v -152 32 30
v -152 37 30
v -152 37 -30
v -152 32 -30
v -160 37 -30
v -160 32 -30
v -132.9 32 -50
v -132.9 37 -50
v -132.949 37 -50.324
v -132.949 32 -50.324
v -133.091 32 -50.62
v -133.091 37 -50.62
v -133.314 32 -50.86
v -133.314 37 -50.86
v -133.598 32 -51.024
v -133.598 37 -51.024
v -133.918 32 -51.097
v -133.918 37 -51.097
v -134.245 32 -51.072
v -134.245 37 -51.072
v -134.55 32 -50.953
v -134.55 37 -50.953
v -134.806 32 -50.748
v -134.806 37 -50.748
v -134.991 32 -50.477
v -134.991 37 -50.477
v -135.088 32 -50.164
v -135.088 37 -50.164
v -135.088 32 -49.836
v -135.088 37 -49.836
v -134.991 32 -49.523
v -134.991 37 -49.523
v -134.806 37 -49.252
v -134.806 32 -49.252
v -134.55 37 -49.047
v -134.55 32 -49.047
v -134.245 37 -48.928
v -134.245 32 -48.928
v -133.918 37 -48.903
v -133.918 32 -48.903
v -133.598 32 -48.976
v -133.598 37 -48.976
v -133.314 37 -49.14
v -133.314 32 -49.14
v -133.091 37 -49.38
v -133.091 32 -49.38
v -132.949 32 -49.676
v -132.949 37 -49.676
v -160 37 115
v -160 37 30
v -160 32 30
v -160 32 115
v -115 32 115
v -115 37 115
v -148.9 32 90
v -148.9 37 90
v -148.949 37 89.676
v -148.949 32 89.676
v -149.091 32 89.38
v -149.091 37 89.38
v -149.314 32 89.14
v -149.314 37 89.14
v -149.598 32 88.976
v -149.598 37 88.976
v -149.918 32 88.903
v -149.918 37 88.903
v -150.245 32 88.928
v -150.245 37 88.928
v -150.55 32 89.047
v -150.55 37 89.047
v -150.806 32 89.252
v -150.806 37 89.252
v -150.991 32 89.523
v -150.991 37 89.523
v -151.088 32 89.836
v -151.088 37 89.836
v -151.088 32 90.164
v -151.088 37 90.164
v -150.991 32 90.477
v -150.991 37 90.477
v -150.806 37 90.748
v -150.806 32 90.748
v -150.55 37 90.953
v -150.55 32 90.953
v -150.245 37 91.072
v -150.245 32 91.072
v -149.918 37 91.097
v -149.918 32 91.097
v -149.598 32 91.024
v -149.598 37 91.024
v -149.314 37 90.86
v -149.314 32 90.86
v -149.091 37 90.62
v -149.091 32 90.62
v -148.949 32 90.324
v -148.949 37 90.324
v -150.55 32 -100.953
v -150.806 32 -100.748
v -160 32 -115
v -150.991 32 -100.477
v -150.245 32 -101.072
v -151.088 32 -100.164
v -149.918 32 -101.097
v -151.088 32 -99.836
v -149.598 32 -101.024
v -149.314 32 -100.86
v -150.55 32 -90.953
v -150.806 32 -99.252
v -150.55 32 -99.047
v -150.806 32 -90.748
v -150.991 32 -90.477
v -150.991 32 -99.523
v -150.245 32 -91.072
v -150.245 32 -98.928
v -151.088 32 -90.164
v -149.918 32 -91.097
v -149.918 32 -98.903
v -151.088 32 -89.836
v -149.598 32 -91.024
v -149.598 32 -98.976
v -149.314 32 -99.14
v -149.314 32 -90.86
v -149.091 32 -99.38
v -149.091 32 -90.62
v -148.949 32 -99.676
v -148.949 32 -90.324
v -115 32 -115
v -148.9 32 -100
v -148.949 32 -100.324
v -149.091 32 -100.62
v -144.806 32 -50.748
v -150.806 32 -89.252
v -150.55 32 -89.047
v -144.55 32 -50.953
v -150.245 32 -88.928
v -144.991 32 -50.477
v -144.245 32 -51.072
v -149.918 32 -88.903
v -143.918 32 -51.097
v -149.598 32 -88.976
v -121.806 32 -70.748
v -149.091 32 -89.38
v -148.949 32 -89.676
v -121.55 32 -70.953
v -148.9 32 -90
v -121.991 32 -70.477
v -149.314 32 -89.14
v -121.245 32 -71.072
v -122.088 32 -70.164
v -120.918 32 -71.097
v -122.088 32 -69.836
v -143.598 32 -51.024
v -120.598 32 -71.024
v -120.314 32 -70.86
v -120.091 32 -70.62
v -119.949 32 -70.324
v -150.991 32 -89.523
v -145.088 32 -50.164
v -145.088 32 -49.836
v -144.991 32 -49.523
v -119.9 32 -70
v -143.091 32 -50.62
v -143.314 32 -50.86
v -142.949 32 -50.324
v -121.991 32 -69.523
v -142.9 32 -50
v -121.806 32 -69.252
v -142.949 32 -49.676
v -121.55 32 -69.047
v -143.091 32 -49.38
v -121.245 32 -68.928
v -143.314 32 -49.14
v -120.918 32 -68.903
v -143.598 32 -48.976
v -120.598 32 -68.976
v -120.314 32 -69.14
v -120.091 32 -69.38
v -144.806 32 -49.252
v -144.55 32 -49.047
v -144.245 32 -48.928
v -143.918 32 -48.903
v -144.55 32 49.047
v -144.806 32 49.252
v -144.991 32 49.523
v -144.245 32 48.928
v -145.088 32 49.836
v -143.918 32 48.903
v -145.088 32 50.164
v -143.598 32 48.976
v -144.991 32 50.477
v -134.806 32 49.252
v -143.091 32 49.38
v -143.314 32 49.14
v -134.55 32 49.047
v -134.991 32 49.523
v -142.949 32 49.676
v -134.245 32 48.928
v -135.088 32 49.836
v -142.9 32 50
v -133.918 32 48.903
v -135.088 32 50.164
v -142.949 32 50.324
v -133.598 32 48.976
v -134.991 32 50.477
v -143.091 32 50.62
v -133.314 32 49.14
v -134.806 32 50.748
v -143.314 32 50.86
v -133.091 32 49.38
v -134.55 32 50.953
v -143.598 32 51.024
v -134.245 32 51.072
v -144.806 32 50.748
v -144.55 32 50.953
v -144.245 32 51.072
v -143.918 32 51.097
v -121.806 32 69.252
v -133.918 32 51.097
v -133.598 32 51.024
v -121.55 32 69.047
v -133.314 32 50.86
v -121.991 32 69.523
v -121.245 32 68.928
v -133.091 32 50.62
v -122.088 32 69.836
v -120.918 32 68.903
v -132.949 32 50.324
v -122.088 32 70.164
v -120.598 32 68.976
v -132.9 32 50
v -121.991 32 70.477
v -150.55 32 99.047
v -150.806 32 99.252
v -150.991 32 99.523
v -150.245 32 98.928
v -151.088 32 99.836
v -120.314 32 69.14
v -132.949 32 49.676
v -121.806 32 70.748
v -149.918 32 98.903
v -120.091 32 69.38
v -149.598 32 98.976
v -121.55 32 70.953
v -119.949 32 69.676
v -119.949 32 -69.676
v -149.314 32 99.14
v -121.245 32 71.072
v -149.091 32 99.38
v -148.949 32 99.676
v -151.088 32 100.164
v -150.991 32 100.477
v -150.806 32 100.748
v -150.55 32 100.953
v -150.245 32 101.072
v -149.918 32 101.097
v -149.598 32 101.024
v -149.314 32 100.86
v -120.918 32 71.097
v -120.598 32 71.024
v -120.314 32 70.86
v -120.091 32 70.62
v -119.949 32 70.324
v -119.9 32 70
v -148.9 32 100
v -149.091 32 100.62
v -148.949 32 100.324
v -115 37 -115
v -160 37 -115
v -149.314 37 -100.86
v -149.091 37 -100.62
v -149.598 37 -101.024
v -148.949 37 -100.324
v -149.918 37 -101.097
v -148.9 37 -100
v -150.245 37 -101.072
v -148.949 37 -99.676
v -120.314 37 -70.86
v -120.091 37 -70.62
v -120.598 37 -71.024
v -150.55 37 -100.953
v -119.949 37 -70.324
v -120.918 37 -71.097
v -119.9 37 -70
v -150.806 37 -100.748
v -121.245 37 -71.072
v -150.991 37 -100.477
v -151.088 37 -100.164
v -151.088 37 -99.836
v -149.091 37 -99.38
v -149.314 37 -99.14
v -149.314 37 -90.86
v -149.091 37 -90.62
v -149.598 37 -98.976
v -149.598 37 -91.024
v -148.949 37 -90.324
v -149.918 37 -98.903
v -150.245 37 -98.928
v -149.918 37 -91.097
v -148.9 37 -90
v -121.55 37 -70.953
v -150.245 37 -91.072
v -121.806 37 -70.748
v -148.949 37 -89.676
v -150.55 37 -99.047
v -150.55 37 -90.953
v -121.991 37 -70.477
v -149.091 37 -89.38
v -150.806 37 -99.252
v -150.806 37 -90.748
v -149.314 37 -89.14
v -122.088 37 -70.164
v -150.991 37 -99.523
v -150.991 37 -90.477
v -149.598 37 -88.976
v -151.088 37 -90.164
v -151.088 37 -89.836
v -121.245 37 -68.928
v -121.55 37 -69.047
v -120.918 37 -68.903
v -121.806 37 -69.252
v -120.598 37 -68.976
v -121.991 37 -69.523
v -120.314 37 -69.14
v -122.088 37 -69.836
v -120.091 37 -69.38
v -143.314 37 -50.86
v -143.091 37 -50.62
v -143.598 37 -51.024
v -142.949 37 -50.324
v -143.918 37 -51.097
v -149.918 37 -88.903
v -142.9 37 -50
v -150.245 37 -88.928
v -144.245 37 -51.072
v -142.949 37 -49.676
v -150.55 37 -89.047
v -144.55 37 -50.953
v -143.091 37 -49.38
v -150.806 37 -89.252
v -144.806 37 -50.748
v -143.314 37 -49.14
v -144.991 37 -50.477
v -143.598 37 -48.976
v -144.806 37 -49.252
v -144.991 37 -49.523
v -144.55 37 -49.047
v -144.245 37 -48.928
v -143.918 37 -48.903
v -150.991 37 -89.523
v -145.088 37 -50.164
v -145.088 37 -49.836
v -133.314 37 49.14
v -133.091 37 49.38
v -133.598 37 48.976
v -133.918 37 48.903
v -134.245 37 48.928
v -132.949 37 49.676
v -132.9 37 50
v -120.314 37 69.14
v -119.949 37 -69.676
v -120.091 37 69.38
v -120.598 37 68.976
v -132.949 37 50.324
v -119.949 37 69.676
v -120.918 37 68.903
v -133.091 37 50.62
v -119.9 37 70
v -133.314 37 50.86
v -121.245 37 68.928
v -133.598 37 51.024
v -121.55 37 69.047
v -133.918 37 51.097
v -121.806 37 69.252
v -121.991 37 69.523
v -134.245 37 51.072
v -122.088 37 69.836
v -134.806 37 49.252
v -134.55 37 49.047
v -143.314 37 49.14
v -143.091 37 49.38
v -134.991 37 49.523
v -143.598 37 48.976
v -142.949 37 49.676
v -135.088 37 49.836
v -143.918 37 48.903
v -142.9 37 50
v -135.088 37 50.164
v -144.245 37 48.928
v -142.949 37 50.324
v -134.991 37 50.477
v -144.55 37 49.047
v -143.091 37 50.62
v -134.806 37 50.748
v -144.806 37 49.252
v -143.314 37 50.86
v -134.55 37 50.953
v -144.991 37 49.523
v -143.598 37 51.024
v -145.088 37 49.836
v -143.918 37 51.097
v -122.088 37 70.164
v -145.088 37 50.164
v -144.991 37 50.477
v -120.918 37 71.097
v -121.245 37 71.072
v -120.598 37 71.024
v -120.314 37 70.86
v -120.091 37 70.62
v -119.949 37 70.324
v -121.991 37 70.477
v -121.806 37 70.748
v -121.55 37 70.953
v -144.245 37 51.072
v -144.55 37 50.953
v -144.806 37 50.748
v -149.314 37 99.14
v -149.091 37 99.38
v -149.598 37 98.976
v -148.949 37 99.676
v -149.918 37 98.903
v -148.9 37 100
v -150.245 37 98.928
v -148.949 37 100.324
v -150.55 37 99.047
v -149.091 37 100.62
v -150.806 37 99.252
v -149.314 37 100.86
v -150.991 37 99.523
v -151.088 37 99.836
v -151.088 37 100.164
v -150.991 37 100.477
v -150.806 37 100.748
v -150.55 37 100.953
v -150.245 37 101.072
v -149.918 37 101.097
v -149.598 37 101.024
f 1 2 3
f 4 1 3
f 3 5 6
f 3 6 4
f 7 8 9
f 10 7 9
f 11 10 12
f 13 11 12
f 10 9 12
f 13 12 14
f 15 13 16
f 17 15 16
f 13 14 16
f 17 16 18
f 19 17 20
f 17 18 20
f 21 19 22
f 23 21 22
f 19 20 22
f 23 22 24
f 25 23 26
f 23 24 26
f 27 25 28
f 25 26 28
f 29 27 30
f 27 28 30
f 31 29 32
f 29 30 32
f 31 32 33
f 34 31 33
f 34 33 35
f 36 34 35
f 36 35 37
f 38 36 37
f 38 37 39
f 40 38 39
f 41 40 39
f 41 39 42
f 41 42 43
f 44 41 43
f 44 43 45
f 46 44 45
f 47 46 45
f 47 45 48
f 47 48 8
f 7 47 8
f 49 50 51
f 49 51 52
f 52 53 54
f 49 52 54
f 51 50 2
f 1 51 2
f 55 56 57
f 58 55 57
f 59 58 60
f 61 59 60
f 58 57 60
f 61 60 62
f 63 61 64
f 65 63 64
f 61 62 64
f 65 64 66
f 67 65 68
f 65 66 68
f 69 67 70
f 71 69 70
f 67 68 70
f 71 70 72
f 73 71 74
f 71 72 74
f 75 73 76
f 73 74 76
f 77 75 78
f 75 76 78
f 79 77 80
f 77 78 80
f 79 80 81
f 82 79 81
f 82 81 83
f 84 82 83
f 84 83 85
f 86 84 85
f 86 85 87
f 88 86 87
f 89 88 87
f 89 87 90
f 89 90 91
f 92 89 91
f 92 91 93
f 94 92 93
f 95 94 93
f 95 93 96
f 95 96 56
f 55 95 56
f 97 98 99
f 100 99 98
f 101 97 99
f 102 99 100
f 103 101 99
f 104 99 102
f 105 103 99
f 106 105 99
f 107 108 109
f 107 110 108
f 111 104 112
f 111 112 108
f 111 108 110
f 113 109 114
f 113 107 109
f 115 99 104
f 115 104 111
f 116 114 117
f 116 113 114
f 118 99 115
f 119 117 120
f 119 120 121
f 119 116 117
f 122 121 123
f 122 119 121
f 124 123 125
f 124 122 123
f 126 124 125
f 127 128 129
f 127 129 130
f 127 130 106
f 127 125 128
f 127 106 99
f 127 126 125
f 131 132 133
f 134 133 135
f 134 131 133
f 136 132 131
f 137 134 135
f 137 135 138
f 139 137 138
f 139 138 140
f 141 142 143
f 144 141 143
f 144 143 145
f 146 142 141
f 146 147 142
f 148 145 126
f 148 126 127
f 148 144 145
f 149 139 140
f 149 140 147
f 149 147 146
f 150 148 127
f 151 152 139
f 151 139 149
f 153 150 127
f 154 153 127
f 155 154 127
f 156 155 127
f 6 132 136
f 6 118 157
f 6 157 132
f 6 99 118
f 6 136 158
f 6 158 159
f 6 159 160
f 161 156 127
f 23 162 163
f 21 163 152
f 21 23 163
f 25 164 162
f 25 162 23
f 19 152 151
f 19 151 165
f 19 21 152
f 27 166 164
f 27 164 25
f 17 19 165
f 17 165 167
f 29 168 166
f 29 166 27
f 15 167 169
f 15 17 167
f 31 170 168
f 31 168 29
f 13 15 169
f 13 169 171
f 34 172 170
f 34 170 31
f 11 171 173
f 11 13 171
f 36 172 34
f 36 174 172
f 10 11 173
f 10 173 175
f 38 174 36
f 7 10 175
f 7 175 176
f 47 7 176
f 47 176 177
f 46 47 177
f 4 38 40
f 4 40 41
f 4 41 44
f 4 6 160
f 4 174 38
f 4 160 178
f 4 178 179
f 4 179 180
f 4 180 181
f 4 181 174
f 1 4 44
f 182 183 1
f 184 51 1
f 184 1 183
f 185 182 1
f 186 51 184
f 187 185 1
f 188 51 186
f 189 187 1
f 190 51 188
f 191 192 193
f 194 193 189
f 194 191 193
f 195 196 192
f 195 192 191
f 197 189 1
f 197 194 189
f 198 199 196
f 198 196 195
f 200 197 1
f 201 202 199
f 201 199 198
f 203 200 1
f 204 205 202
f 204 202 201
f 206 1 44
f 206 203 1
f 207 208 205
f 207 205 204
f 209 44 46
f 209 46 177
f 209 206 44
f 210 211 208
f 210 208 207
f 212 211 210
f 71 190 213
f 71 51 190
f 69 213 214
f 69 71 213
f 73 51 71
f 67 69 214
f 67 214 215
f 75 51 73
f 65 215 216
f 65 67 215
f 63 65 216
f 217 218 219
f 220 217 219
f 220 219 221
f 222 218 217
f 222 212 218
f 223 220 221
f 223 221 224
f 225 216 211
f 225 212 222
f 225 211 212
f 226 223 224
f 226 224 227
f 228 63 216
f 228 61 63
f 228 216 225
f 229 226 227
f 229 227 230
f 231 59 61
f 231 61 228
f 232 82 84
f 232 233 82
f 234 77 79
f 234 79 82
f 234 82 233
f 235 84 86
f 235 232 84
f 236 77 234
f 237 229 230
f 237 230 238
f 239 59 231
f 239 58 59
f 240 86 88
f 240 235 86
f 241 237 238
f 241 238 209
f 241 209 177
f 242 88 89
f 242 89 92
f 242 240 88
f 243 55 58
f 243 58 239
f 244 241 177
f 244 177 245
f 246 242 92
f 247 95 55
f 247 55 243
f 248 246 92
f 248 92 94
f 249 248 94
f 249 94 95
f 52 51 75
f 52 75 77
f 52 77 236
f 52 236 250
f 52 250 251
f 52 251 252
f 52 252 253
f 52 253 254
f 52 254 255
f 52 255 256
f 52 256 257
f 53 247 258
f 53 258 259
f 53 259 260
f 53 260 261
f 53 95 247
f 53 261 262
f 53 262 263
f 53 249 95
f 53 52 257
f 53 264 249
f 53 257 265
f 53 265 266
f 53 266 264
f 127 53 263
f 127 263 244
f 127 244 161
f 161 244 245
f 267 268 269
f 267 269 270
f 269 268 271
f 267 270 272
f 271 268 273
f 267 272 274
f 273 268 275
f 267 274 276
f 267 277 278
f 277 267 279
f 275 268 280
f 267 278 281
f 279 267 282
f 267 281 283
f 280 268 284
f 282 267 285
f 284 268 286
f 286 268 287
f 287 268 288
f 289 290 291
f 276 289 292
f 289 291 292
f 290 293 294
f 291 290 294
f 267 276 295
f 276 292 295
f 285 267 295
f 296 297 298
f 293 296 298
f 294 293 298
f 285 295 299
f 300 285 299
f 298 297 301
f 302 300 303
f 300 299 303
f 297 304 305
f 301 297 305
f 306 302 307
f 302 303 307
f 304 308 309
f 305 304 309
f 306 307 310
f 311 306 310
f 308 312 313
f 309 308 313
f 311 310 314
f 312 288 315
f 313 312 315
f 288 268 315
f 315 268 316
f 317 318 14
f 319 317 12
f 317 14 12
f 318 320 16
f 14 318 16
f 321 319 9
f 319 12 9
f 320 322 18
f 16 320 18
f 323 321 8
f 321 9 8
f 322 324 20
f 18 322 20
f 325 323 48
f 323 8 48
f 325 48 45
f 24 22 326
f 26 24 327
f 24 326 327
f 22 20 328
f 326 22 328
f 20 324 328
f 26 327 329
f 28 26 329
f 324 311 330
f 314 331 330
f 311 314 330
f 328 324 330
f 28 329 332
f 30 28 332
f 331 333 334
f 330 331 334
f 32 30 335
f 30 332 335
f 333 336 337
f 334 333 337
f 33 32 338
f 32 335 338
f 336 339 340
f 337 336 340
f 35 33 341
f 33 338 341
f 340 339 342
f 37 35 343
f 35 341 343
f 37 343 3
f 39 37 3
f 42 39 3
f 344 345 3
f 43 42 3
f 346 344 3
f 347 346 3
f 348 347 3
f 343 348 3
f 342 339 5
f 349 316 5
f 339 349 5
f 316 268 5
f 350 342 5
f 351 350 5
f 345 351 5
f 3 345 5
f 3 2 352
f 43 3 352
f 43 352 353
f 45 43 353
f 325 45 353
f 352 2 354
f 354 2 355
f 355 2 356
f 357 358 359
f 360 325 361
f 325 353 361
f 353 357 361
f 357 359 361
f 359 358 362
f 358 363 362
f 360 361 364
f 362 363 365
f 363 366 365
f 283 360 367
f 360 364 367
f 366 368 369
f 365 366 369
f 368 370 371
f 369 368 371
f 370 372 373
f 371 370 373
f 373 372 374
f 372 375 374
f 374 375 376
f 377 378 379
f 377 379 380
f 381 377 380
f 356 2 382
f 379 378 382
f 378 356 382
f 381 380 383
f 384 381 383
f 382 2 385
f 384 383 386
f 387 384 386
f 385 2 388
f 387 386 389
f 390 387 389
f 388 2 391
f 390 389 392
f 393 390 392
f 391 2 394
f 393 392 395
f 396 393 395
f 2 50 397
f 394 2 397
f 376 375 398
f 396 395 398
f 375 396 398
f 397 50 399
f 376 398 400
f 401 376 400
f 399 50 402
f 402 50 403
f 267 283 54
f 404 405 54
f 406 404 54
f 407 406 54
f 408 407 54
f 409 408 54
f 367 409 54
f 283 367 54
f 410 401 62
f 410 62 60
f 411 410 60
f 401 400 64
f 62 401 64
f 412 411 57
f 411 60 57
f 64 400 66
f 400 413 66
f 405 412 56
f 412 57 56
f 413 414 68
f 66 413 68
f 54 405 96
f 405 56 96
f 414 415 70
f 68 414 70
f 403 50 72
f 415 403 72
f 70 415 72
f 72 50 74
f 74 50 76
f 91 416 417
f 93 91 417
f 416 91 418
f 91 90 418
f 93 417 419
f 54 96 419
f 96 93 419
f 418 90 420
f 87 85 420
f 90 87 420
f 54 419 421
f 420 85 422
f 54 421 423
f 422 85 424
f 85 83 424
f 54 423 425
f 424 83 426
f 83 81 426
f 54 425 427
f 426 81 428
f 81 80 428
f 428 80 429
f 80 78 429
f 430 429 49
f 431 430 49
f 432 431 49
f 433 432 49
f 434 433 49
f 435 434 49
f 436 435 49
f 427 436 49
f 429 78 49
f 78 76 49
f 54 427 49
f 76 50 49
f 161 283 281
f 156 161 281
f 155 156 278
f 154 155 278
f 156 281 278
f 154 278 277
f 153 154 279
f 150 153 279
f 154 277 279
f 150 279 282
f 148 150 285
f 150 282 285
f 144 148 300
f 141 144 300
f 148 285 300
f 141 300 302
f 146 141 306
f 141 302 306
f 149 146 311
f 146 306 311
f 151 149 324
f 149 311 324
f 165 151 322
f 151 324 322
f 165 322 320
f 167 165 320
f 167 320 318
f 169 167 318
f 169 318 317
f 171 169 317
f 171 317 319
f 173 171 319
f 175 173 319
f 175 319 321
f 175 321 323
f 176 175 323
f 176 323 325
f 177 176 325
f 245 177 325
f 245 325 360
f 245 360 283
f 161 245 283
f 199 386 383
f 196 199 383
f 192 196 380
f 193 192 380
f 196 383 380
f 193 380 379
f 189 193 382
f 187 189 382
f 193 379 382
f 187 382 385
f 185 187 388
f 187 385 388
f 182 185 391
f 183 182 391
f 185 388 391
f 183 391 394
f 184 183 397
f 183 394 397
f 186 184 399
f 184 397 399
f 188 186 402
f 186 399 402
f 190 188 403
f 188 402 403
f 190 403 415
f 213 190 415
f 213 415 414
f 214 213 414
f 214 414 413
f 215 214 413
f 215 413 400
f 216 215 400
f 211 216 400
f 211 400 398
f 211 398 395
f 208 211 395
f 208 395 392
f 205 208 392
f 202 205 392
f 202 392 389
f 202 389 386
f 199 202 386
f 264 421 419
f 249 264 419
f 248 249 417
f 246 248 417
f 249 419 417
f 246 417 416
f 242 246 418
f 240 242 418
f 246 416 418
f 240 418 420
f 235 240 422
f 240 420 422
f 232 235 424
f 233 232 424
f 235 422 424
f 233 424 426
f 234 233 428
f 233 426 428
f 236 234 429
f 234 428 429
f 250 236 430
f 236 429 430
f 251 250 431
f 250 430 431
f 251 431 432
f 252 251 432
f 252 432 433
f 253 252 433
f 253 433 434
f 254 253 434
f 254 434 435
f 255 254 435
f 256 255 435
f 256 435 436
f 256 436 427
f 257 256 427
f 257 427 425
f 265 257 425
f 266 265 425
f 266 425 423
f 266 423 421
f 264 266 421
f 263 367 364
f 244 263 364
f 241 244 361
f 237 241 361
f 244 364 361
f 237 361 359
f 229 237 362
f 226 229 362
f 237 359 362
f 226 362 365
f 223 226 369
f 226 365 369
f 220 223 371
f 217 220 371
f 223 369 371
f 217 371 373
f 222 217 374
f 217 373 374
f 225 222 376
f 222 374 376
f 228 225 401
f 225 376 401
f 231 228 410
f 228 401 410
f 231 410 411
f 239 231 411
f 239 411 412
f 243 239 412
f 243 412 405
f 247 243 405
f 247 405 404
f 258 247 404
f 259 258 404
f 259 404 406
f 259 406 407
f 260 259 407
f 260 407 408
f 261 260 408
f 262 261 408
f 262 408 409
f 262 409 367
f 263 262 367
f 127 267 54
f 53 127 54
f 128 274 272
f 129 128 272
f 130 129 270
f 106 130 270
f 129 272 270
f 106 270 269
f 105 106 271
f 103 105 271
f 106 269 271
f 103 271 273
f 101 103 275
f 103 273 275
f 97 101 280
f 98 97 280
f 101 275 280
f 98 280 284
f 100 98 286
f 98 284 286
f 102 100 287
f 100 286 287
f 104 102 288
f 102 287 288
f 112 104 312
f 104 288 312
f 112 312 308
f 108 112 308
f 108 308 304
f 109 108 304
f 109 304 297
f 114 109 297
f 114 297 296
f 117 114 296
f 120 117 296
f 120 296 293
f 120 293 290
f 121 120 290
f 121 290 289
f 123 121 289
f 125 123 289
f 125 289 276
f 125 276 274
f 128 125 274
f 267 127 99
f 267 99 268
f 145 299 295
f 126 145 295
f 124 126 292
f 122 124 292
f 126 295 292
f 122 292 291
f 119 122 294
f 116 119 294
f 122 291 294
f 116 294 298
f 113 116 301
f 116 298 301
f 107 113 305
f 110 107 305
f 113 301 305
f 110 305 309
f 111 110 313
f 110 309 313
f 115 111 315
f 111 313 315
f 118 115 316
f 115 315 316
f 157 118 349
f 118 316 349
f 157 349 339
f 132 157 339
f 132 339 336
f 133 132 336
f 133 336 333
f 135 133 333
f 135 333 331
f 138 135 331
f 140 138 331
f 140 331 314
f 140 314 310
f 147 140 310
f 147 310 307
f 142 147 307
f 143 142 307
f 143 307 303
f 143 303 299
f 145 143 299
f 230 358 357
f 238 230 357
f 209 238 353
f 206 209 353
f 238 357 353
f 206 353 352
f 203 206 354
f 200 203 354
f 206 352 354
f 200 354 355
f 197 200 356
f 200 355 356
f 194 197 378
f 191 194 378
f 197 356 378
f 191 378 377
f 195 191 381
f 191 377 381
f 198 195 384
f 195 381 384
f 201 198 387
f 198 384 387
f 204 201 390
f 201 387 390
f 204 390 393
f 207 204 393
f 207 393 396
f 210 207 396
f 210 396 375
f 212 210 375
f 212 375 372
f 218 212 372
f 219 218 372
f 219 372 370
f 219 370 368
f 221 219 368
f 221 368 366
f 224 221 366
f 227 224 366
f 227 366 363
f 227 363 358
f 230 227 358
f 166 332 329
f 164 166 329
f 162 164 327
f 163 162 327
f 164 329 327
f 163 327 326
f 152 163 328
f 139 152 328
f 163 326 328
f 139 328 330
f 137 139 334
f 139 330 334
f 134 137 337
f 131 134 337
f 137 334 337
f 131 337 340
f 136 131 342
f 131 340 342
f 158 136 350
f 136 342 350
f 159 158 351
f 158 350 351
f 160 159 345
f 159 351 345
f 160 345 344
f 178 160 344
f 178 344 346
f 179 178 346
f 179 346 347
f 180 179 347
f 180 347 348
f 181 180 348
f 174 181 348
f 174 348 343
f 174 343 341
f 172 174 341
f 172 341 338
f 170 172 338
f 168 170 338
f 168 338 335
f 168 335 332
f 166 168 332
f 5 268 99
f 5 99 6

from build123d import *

# Parameters (mm, degrees)
SKETCH1_W                      = 5
SKETCH1_H                      = 110
BOSS_EXTRUDE1_DEPTH            = 120
BOSS_EXTRUDE1_DEPTH_BACK       = 110
BOSS_EXTRUDE1_2_DEPTH          = 120
BOSS_EXTRUDE1_2_DEPTH_BACK     = 110
SKETCH2_W                      = 5
SKETCH2_H                      = 37
BOSS_EXTRUDE2_DEPTH            = 50
SKETCH3_W                      = 220
SKETCH3_H                      = 5
BOSS_EXTRUDE3_DEPTH            = 50
SKETCH4_W                      = 230
SKETCH4_H                      = 73
BOSS_EXTRUDE6_DEPTH            = 5
CUT_EXTRUDE3_DEPTH             = 231
SKETCH5_W                      = 348
SKETCH5_H                      = 227
SKETCH5_W_2                    = 328
SKETCH5_H_2                    = 207
BOSS_EXTRUDE7_DEPTH            = 5
BOSS_EXTRUDE8_DEPTH            = 59
FILLET5_R                      = 15
BOSS_EXTRUDE9_DEPTH            = 5
BOSS_EXTRUDE10_DEPTH           = 5
FILLET6_R                      = 3
CUT_EXTRUDE4_DEPTH             = 165.048773235
SKETCH15_W                     = 45
SKETCH15_H                     = 32
CUT_EXTRUDE5_DEPTH             = 1
CUT_EXTRUDE5_DEPTH_BACK        = 231
SKETCH16_R                     = 1.1
HOLES_FOR_PART_1_DEPTH         = 6
SKETCH17_R                     = 1.1
HOLES_FOR_FORWARD_PART_4_DEPTH = 6
SKETCH18_R                     = 1.1
HOLES_FOR_FORWARD_PART_2_DEPTH = 6
SKETCH19_W                     = 16
SKETCH19_H                     = 60
CUT_EXTRUDE6_DEPTH             = 6


with BuildPart() as part:
    # Sketch1 → Boss-Extrude1 (new body, two sides)
    with BuildSketch(Plane(origin=(0, 0, 0), x_dir=(0, 0, -1), z_dir=(1, 0, 0))) as boss_extrude1_sk:
        with Locations((-112.5, 55)):
            Rectangle(SKETCH1_W, SKETCH1_H)
    extrude(amount=BOSS_EXTRUDE1_DEPTH)
    extrude(boss_extrude1_sk.sketch, amount=-BOSS_EXTRUDE1_DEPTH_BACK)



with BuildPart() as body_2:
    # Sketch1 → Boss-Extrude1 2 (new body, two sides)
    with BuildSketch(Plane(origin=(0, 0, 0), x_dir=(0, 0, -1), z_dir=(1, 0, 0))) as boss_extrude1_2_sk:
        with Locations((112.5, 55)):
            Rectangle(SKETCH1_W, SKETCH1_H)
    extrude(amount=BOSS_EXTRUDE1_2_DEPTH)
    extrude(boss_extrude1_2_sk.sketch, amount=-BOSS_EXTRUDE1_2_DEPTH_BACK)


with BuildPart() as part_1:
    add(part.part)

    add(body_2.part)  # Boss-Extrude2 merges body 2
    # Sketch2 → Boss-Extrude2 (add)
    with BuildSketch(Plane.ZY.offset(110)):
        with Locations((-112.5, 18.5)):
            Rectangle(SKETCH2_W, SKETCH2_H)
        with Locations((112.5, 18.5)):
            Rectangle(SKETCH2_W, SKETCH2_H)
    extrude(amount=BOSS_EXTRUDE2_DEPTH)

    # Sketch3 → Boss-Extrude3 (add)
    with BuildSketch(Plane.ZY.offset(160)):
        with Locations((0, 34.5)):
            Rectangle(SKETCH3_W, SKETCH3_H)
    extrude(amount=-BOSS_EXTRUDE3_DEPTH)

    # Sketch4 → Boss-Extrude6 (add)
    with BuildSketch(Plane.ZY.offset(110)):
        with Locations((0, 73.5)):
            Rectangle(SKETCH4_W, SKETCH4_H)
    extrude(amount=BOSS_EXTRUDE6_DEPTH)

    # Sketch9 → Cut-Extrude3 (cut, through all)
    with BuildSketch(Plane.XY.offset(115)):
        Polygon((120, 110), (116.464466094, 106.464466094), (120, 102.928932188), align=None)
    extrude(amount=-CUT_EXTRUDE3_DEPTH, mode=Mode.SUBTRACT)

    # Sketch10 → Boss-Extrude8 (add)
    with BuildSketch(Plane.XY.offset(115)):
        Polygon((120, 110), (111.464466094, 110), (111.464466094, 0), (120, 0), (120, 102.928932188), (116.464466094, 106.464466094), align=None)
    boss_extrude8 = extrude(amount=BOSS_EXTRUDE8_DEPTH)

    # Mirror3: Boss-Extrude8 across plane
    add(boss_extrude8.mirror(Plane.XY))

    # Fillet5
    fillet5_edges = [part_1.edges().sort_by_distance(p)[0] for p in [
        (111.464466094, 55, 115),
        (111.464466094, 55, -115),
    ]]
    fillet(fillet5_edges, radius=FILLET5_R)

    # Fillet6
    fillet6_edges = [part_1.edges().sort_by_distance(p)[0] for p in [
        (111.464466094, 55, 174),
        (111.464466094, 55, -174),
    ]]
    fillet(fillet6_edges, radius=FILLET6_R)


with BuildPart() as body_2_2:
    # Sketch5 → Boss-Extrude7 (new body)
    with BuildSketch(Plane(origin=(115, 115, 0), x_dir=(0, 0, 1), z_dir=(-0.707106781, -0.707106781, 0))):
        with Locations((0, -120.571067812)):
            Rectangle(SKETCH5_W, SKETCH5_H)
        with Locations((0, -120.571067812)):
            Rectangle(SKETCH5_W_2, SKETCH5_H_2, mode=Mode.SUBTRACT)
    extrude(amount=BOSS_EXTRUDE7_DEPTH)


with BuildPart() as body_3:
    # Sketch12 → Boss-Extrude9 (new body)
    with BuildSketch(Plane.XY.offset(174)):
        Polygon((120, 0), (222.928932188, 0), (120, 102.928932188), align=None)
    extrude(amount=-BOSS_EXTRUDE9_DEPTH)


with BuildPart() as body_4:
    # Sketch13 → Boss-Extrude10 (new body)
    with BuildSketch(Plane(origin=(0, 0, -174), x_dir=(-1, 0, 0), z_dir=(0, 0, -1))):
        Polygon((-120, 102.928932188), (-120, 0), (-222.928932188, 0), align=None)
    extrude(amount=-BOSS_EXTRUDE10_DEPTH)


with BuildPart() as cut_extrude4_tool:
    # Sketch14 → Cut-Extrude4 (new body, through all)
    with BuildSketch(Plane(origin=(0, 110, 0), x_dir=(1, 0, 0), z_dir=(0, 1, 0))):
        Polygon((-115, 115), (-115, -115), (-167.30995795, -115), (-167.30995795, -200.602059027), (289.684331767, -200.602059027), (289.684331767, -115), (289.684331767, 105), (289.684331767, 193.761157723), (-167.30995795, 193.761157723), (-167.30995795, 115), align=None)
    extrude(amount=-CUT_EXTRUDE4_DEPTH)


with BuildPart() as part_2:
    add(part_1.part)

    # Cut-Extrude4: cut by cut_extrude4_tool
    add(cut_extrude4_tool.part, mode=Mode.SUBTRACT)

    # Sketch15 → Cut-Extrude5 (cut, two sides)
    with BuildSketch(Plane.XY.offset(115)) as cut_extrude5_sk:
        with Locations((-137.5, 16)):
            Rectangle(SKETCH15_W, SKETCH15_H)
    extrude(amount=CUT_EXTRUDE5_DEPTH, mode=Mode.SUBTRACT)
    extrude(cut_extrude5_sk.sketch, amount=-CUT_EXTRUDE5_DEPTH_BACK, mode=Mode.SUBTRACT)

    # Sketch16 → Holes for part 1 (cut, through all)
    with BuildSketch(Plane(origin=(0, 37, 0), x_dir=(1, 0, 0), z_dir=(0, 1, 0))):
        with Locations((-150, -100)):
            Circle(SKETCH16_R)
        with Locations((-150, -90)):
            Circle(SKETCH16_R)
        with Locations((-150, 90)):
            Circle(SKETCH16_R)
        with Locations((-150, 100)):
            Circle(SKETCH16_R)
    extrude(amount=-HOLES_FOR_PART_1_DEPTH, mode=Mode.SUBTRACT)

    # Sketch17 → Holes for forward part 4 (cut, through all)
    with BuildSketch(Plane(origin=(0, 37, 0), x_dir=(1, 0, 0), z_dir=(0, 1, 0))):
        with Locations((-121, 70)):
            Circle(SKETCH17_R)
        with Locations((-121, -70)):
            Circle(SKETCH17_R)
    extrude(amount=-HOLES_FOR_FORWARD_PART_4_DEPTH, mode=Mode.SUBTRACT)

    # Sketch18 → Holes for forward part 2 (cut, through all)
    with BuildSketch(Plane(origin=(0, 37, 0), x_dir=(1, 0, 0), z_dir=(0, 1, 0))):
        with Locations((-134, 50)):
            Circle(SKETCH18_R)
        with Locations((-144, 50)):
            Circle(SKETCH18_R)
        with Locations((-144, -50)):
            Circle(SKETCH18_R)
        with Locations((-134, -50)):
            Circle(SKETCH18_R)
    extrude(amount=-HOLES_FOR_FORWARD_PART_2_DEPTH, mode=Mode.SUBTRACT)

    # Sketch19 → Cut-Extrude6 (cut, through all)
    with BuildSketch(Plane(origin=(0, 37, 0), x_dir=(1, 0, 0), z_dir=(0, 1, 0))):
        with Locations((-160, 0)):
            Rectangle(SKETCH19_W, SKETCH19_H)
    extrude(amount=-CUT_EXTRUDE6_DEPTH, mode=Mode.SUBTRACT)


with BuildPart() as body_2_2_1:
    add(body_2_2.part)

    # Cut-Extrude4: cut by cut_extrude4_tool
    add(cut_extrude4_tool.part, mode=Mode.SUBTRACT)


with BuildPart() as body_3_1:
    add(body_3.part)

    # Cut-Extrude4: cut by cut_extrude4_tool
    add(cut_extrude4_tool.part, mode=Mode.SUBTRACT)


with BuildPart() as body_4_1:
    add(body_4.part)

    # Cut-Extrude4: cut by cut_extrude4_tool
    add(cut_extrude4_tool.part, mode=Mode.SUBTRACT)


solid = part_2.part
